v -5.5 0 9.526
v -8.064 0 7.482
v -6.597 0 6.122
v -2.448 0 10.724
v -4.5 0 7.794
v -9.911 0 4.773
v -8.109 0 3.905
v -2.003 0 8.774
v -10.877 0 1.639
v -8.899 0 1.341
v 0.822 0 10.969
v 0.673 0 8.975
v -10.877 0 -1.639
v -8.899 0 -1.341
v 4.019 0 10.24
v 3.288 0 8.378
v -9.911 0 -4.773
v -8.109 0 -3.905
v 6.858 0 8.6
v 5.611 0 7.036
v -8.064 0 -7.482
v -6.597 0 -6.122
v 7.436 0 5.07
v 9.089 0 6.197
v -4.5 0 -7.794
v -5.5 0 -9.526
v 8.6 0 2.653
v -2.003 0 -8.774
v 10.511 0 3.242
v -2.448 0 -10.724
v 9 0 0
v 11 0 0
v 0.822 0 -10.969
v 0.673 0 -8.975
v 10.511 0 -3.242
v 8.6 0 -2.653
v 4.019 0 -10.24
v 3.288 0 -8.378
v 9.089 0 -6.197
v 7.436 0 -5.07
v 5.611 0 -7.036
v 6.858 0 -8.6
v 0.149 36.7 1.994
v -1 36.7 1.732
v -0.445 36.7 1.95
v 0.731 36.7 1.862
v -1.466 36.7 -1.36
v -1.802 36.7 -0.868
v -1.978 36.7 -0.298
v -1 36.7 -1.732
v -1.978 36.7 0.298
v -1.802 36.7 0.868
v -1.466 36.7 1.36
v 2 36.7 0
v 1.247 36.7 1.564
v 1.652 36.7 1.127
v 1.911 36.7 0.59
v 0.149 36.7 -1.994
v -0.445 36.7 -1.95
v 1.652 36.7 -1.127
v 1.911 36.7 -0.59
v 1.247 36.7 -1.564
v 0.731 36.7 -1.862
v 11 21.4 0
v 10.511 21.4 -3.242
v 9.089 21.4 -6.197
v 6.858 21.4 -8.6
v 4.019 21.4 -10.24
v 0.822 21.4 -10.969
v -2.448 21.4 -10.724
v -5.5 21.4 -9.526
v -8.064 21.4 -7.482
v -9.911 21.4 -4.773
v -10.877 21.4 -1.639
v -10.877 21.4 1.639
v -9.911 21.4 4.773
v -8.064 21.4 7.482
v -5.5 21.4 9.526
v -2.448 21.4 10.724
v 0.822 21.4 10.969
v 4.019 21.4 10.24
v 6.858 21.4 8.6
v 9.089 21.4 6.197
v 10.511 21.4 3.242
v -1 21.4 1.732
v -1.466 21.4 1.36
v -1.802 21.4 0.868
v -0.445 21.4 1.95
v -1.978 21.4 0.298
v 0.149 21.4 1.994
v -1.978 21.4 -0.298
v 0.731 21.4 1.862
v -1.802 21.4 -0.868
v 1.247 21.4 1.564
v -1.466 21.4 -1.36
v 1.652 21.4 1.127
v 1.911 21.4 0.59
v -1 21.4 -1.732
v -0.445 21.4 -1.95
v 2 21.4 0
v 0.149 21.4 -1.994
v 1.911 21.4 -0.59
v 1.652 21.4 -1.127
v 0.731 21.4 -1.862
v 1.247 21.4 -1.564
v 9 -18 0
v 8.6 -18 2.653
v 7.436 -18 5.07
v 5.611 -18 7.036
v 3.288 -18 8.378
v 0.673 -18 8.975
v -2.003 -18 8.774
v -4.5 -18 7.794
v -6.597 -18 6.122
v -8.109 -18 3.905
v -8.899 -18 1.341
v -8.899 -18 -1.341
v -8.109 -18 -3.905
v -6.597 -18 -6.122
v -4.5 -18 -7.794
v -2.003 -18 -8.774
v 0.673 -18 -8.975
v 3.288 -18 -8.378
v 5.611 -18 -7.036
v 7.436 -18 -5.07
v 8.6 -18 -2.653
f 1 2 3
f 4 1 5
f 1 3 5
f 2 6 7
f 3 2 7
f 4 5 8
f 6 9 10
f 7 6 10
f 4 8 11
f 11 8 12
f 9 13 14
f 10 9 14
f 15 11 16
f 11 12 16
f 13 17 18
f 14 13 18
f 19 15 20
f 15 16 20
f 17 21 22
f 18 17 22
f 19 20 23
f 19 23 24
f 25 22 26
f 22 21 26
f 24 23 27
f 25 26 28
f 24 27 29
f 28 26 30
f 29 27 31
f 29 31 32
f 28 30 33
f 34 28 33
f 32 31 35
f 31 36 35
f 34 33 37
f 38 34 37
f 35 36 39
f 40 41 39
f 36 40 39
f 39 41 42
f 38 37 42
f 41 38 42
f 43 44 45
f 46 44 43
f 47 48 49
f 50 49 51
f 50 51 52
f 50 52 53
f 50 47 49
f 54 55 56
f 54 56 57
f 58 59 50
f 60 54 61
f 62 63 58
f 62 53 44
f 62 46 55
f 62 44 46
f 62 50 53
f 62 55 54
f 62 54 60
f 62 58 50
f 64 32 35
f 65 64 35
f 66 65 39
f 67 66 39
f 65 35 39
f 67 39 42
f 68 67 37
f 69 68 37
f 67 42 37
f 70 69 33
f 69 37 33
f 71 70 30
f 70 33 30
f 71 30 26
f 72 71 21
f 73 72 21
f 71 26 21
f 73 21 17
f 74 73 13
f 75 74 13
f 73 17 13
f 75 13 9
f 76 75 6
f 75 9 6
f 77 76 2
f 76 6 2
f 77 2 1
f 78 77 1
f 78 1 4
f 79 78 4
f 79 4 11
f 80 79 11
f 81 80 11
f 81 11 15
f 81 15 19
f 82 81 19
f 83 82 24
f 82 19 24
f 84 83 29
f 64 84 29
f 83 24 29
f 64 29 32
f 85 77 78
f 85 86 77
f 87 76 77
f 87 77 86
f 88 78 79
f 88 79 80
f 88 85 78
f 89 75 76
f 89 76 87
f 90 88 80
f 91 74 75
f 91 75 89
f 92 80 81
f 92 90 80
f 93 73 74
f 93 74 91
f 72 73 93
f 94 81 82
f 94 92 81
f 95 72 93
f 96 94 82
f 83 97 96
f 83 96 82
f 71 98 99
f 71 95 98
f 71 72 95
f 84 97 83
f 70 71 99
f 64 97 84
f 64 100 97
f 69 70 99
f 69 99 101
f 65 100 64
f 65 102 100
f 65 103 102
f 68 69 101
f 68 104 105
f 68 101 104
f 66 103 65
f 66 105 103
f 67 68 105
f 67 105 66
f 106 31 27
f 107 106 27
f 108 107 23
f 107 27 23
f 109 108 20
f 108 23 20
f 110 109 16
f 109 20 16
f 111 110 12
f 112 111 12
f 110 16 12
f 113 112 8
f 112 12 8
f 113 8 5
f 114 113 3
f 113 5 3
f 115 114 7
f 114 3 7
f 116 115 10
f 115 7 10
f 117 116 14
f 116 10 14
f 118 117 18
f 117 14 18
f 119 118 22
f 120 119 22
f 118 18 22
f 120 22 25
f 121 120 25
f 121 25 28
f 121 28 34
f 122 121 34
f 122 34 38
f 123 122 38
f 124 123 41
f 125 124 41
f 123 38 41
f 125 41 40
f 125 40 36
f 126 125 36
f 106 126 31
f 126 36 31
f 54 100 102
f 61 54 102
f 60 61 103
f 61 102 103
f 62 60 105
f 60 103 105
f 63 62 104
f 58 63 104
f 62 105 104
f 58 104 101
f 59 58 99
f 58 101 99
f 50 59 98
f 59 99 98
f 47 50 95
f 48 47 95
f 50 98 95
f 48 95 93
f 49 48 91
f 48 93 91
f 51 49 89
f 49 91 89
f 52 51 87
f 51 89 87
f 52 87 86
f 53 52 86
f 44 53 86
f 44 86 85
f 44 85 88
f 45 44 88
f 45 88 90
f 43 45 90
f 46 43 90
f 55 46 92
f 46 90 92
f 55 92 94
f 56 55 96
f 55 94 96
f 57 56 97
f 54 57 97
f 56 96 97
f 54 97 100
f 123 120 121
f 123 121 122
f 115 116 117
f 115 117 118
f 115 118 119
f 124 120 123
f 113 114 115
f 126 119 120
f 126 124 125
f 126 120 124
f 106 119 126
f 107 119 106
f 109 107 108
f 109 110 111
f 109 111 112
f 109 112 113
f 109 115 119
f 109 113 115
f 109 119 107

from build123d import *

# Parameters (mm, degrees)
CROQUIS1_R              = 11
SALIENTE_EXTRUIR1_DEPTH = 21.4
CROQUIS2_R              = 2
SALIENTE_EXTRUIR2_DEPTH = 15.3
CROQUIS3_R              = 9
SALIENTE_EXTRUIR3_DEPTH = 18


with BuildPart() as part:
    # Croquis1 → Saliente-Extruir1 (new body)
    with BuildSketch(Plane(origin=(0, 0, 0), x_dir=(1, 0, 0), z_dir=(0, 1, 0))):
        Circle(CROQUIS1_R)
    extrude(amount=SALIENTE_EXTRUIR1_DEPTH)

    # Croquis2 → Saliente-Extruir2 (add)
    with BuildSketch(Plane(origin=(0, 21.4, 0), x_dir=(1, 0, 0), z_dir=(0, 1, 0))):
        Circle(CROQUIS2_R)
    extrude(amount=SALIENTE_EXTRUIR2_DEPTH)

    # Croquis3 → Saliente-Extruir3 (add)
    with BuildSketch(Plane.XZ):
        Circle(CROQUIS3_R)
    extrude(amount=SALIENTE_EXTRUIR3_DEPTH)


solid = part.part
